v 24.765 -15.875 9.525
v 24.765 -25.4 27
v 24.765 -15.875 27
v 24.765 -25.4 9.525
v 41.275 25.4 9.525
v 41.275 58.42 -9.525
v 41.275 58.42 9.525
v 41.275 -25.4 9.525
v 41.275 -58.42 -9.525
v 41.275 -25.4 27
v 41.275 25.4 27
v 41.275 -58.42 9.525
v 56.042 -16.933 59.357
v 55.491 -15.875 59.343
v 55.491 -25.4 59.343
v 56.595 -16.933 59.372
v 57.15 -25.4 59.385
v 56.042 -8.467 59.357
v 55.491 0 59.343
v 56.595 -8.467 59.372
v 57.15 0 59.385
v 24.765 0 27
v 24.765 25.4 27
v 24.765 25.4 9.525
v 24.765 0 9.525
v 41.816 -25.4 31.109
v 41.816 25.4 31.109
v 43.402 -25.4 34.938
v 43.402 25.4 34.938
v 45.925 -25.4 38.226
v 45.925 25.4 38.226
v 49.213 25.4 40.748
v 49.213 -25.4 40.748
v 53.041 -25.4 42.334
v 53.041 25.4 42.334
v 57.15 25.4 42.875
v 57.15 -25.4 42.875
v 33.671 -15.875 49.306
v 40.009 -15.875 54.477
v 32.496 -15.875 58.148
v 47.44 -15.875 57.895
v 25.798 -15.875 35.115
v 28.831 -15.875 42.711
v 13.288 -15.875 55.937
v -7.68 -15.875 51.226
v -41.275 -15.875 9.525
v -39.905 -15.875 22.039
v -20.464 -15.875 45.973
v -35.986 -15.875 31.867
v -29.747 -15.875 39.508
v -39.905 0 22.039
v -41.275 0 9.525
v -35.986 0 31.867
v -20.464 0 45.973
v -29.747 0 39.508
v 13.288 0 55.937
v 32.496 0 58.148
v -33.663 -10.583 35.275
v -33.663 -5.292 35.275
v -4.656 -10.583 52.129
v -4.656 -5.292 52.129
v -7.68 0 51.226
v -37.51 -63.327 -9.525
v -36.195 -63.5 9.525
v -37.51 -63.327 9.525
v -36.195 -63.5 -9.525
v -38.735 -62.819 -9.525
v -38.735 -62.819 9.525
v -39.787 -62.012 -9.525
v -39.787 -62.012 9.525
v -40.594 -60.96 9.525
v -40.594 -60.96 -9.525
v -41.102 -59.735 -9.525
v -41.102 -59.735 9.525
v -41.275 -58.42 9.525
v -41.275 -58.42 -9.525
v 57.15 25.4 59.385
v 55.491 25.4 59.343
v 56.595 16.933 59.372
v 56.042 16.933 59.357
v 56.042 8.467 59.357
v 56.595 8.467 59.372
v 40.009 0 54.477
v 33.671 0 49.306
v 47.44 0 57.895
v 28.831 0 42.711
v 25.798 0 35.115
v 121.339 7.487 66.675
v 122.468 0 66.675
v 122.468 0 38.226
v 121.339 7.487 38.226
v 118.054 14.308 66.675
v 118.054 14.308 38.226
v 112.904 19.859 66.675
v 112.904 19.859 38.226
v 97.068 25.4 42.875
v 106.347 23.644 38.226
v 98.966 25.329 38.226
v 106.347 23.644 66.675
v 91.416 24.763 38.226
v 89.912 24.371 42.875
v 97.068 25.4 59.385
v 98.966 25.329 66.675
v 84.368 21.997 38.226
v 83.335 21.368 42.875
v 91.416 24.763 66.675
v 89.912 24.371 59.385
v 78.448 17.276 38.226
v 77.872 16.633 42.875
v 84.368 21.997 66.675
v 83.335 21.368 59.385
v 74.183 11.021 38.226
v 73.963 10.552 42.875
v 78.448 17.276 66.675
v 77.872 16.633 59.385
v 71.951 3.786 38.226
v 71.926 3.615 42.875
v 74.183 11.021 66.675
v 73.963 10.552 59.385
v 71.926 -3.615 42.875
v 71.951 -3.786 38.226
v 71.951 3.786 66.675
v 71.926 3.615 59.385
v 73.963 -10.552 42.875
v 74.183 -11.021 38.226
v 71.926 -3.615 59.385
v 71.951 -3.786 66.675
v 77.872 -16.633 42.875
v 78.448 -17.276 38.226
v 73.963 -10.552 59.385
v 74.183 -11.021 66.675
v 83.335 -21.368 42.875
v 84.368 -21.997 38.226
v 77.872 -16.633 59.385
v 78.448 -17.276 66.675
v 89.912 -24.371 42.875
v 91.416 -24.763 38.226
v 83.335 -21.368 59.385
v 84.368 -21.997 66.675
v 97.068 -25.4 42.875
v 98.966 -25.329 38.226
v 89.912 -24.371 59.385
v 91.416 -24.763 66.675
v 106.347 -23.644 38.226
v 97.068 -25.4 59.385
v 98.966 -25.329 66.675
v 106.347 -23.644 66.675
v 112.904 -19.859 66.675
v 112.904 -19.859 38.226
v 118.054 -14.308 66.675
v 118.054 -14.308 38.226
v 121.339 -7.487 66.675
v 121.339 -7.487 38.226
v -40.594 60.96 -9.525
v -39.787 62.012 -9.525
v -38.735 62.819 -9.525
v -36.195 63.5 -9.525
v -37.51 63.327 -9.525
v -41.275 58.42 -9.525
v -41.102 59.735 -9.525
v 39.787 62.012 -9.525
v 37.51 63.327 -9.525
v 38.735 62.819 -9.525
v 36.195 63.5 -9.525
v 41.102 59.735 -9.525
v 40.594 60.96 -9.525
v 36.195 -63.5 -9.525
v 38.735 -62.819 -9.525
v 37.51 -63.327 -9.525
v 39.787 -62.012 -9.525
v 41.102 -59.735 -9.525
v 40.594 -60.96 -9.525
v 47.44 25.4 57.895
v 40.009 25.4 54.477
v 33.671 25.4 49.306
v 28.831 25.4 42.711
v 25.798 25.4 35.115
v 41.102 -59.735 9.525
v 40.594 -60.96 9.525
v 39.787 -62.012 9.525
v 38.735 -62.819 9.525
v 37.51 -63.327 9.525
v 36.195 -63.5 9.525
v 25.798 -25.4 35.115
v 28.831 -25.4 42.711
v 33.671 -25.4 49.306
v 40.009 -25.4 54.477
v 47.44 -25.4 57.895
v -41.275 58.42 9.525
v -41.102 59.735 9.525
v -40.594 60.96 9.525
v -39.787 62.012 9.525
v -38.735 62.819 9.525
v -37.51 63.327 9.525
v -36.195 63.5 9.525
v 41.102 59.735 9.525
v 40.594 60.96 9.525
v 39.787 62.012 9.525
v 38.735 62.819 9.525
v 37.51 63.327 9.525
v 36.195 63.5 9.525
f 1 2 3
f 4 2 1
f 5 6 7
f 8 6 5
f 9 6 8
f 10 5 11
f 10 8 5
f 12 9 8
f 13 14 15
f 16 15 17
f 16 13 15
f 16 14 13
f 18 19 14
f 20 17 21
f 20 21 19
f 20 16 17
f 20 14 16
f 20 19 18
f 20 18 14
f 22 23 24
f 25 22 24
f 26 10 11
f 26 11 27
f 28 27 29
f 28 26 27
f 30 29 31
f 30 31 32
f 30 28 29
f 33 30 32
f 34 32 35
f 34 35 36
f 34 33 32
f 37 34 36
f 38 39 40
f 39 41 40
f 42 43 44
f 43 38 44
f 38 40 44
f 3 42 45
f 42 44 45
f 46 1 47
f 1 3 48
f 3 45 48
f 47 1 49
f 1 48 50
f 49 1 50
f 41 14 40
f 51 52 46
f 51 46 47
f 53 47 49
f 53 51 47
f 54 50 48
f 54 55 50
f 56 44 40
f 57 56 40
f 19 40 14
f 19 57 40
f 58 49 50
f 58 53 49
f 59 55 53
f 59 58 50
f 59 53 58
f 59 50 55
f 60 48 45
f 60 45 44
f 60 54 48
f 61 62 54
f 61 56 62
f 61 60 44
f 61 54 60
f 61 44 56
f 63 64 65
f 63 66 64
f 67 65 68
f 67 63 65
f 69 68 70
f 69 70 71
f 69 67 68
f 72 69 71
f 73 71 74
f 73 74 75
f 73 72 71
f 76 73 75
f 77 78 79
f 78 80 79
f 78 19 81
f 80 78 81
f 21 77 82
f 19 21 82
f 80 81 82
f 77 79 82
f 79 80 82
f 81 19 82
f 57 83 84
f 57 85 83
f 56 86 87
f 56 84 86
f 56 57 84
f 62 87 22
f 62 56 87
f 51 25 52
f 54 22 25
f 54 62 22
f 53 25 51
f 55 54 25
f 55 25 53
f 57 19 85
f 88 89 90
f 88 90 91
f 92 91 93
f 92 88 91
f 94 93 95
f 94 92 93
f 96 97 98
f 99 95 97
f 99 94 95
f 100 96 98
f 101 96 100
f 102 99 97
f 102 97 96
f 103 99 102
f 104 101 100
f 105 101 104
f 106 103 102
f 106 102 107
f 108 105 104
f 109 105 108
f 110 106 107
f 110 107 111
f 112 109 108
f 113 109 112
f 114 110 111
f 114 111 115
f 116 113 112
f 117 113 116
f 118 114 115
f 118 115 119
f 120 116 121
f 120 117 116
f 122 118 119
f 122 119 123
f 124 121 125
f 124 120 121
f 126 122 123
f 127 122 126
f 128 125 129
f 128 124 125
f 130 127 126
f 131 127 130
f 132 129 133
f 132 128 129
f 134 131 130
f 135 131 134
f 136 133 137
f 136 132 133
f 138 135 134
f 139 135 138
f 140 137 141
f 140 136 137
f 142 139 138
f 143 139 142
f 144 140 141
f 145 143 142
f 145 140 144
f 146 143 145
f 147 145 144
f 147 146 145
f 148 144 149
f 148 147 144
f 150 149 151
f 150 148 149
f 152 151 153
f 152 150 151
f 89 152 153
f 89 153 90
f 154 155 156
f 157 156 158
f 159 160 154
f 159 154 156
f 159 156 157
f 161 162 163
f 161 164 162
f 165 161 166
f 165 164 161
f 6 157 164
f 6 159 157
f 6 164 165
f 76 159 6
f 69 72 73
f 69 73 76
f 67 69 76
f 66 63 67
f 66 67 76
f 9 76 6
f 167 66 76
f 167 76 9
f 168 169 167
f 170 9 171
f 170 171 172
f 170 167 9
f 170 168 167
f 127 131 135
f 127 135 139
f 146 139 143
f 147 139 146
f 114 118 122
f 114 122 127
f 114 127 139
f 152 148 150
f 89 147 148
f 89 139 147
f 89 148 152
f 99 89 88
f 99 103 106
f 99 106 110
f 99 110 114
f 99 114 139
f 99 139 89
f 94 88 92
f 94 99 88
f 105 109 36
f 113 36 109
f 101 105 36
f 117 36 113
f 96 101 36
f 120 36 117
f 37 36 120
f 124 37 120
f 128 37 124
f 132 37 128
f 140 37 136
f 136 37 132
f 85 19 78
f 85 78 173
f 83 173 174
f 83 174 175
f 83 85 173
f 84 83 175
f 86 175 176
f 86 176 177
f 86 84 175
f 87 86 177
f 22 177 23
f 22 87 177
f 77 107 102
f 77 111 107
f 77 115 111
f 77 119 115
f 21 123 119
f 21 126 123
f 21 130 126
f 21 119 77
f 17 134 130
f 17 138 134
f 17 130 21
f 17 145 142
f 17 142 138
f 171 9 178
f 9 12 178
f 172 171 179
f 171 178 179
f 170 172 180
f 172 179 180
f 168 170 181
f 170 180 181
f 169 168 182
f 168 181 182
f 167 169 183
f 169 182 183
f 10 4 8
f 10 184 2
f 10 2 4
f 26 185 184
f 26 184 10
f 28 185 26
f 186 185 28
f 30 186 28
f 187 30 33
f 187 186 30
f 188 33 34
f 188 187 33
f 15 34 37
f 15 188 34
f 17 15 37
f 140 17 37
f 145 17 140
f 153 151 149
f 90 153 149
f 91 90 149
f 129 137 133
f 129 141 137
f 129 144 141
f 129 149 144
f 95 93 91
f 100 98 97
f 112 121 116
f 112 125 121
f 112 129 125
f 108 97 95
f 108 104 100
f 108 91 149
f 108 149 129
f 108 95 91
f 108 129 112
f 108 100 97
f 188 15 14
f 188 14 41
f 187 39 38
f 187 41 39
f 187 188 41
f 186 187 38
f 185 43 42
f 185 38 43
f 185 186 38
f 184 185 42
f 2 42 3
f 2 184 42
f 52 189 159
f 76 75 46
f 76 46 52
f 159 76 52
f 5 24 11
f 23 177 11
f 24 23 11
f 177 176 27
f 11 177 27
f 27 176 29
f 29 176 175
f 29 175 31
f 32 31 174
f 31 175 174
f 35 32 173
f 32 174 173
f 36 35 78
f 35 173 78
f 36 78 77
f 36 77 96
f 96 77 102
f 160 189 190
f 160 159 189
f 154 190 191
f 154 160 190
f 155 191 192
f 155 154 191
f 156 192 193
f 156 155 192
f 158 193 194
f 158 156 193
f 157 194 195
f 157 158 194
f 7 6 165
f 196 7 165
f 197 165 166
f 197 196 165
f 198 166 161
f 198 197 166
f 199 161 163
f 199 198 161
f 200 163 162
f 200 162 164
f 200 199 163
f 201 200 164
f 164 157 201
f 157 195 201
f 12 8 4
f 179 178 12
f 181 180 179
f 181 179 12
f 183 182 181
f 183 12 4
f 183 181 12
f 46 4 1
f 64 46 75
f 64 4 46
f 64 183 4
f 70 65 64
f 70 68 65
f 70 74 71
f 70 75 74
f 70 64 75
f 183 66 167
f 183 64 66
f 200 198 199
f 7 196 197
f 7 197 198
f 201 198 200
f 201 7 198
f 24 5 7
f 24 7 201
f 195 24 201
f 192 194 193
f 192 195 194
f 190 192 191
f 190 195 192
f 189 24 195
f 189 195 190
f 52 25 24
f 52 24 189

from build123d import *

# Parameters (mm, degrees)
F1_DEPTH = 63.5
F0_W     = 25.4
F0_H     = 16.51
F2_DEPTH = 25.4
F3_DEPTH = 15.875
F5_R     = 5.08


with BuildPart() as f1:
    # F0 (on Front) → F1 (new body, symmetric)
    with BuildSketch(Plane.XZ):
        Polygon((-41.275, -9.525), (41.275, -9.525), (41.275, 9.525), (24.765, 9.525), (-41.275, 9.525), align=None)
    extrude(amount=F1_DEPTH, both=True)

    # F0 (on Front) → F2 (join, symmetric)
    with BuildSketch(Plane.XZ):
        with BuildLine():
            Line((24.765, 9.525), (41.275, 9.525))
            Line((41.275, 9.525), (41.275, 27.0002))
            ThreePointArc((41.275, 27.0002), (45.9246798487, 38.2255201513), (57.15, 42.8752))
            Line((57.15, 42.8752), (71.6676590706, 42.8752))
            Line((71.6676590706, 42.8752), (71.6676590706, 59.3852))
            Line((71.6676590706, 59.3852), (57.15, 59.3852))
            add(Edge.make_bspline(
                [(55.4911539535, 59.3426868369), (56.0411228755, 59.3576141574), (56.5940666192, 59.3717855904), (57.15, 59.3852)],
                knots=[109.5705582986, 109.5705582986, 109.5705582986, 109.5705582986, 110.3336764956, 110.3336764956, 110.3336764956, 110.3336764956], degree=3))
            ThreePointArc((55.4911539535, 59.3426868369), (33.6711802446, 49.3056533218), (24.765, 27.0002))
            Line((24.765, 27.0002), (24.765, 9.525))
        make_face()
        with Locations((84.3676590706, 51.1302)):
            Rectangle(F0_W, F0_H)
    extrude(amount=F2_DEPTH, both=True)

    # F0 (on Front) → F3 (join)
    with BuildSketch(Plane.XZ):
        with BuildLine():
            add(Edge.make_bspline(
                [(-41.275, 9.525), (-41.1119862011, 39.4727109484), (-23.4748595098, 57.1993821099), (55.4911539535, 59.3426868369)],
                knots=[0, 0, 0, 0, 109.5705582986, 109.5705582986, 109.5705582986, 109.5705582986], degree=3))
            Line((-41.275, 9.525), (24.765, 9.525))
            Line((24.765, 9.525), (24.765, 27.0002))
            ThreePointArc((24.765, 27.0002), (33.6711802446, 49.3056533218), (55.4911539535, 59.3426868369))
        make_face()
    extrude(amount=F3_DEPTH)

    # F0 (on Front) → F4 (revolve)
    with BuildSketch(Plane.XZ):
        Polygon((97.0676590706, 59.3852), (97.0676590706, 42.8752), (97.0676590706, 38.2255201513), (122.4676590706, 38.2255201513), (122.4676590706, 66.675), (97.0676590706, 66.675), align=None)
    revolve(axis=Axis((97.0676590706, 0, 52.4502600757), (0, 0, 1)))

    # F5
    f5_edges = [f1.edges().sort_by_distance(p)[0] for p in [
        (41.275, -63.5, 0),
        (-41.275, -63.5, 0),
        (41.275, 63.5, 0),
        (-41.275, 63.5, 0),
    ]]
    fillet(f5_edges, radius=F5_R)


solid = f1.part
